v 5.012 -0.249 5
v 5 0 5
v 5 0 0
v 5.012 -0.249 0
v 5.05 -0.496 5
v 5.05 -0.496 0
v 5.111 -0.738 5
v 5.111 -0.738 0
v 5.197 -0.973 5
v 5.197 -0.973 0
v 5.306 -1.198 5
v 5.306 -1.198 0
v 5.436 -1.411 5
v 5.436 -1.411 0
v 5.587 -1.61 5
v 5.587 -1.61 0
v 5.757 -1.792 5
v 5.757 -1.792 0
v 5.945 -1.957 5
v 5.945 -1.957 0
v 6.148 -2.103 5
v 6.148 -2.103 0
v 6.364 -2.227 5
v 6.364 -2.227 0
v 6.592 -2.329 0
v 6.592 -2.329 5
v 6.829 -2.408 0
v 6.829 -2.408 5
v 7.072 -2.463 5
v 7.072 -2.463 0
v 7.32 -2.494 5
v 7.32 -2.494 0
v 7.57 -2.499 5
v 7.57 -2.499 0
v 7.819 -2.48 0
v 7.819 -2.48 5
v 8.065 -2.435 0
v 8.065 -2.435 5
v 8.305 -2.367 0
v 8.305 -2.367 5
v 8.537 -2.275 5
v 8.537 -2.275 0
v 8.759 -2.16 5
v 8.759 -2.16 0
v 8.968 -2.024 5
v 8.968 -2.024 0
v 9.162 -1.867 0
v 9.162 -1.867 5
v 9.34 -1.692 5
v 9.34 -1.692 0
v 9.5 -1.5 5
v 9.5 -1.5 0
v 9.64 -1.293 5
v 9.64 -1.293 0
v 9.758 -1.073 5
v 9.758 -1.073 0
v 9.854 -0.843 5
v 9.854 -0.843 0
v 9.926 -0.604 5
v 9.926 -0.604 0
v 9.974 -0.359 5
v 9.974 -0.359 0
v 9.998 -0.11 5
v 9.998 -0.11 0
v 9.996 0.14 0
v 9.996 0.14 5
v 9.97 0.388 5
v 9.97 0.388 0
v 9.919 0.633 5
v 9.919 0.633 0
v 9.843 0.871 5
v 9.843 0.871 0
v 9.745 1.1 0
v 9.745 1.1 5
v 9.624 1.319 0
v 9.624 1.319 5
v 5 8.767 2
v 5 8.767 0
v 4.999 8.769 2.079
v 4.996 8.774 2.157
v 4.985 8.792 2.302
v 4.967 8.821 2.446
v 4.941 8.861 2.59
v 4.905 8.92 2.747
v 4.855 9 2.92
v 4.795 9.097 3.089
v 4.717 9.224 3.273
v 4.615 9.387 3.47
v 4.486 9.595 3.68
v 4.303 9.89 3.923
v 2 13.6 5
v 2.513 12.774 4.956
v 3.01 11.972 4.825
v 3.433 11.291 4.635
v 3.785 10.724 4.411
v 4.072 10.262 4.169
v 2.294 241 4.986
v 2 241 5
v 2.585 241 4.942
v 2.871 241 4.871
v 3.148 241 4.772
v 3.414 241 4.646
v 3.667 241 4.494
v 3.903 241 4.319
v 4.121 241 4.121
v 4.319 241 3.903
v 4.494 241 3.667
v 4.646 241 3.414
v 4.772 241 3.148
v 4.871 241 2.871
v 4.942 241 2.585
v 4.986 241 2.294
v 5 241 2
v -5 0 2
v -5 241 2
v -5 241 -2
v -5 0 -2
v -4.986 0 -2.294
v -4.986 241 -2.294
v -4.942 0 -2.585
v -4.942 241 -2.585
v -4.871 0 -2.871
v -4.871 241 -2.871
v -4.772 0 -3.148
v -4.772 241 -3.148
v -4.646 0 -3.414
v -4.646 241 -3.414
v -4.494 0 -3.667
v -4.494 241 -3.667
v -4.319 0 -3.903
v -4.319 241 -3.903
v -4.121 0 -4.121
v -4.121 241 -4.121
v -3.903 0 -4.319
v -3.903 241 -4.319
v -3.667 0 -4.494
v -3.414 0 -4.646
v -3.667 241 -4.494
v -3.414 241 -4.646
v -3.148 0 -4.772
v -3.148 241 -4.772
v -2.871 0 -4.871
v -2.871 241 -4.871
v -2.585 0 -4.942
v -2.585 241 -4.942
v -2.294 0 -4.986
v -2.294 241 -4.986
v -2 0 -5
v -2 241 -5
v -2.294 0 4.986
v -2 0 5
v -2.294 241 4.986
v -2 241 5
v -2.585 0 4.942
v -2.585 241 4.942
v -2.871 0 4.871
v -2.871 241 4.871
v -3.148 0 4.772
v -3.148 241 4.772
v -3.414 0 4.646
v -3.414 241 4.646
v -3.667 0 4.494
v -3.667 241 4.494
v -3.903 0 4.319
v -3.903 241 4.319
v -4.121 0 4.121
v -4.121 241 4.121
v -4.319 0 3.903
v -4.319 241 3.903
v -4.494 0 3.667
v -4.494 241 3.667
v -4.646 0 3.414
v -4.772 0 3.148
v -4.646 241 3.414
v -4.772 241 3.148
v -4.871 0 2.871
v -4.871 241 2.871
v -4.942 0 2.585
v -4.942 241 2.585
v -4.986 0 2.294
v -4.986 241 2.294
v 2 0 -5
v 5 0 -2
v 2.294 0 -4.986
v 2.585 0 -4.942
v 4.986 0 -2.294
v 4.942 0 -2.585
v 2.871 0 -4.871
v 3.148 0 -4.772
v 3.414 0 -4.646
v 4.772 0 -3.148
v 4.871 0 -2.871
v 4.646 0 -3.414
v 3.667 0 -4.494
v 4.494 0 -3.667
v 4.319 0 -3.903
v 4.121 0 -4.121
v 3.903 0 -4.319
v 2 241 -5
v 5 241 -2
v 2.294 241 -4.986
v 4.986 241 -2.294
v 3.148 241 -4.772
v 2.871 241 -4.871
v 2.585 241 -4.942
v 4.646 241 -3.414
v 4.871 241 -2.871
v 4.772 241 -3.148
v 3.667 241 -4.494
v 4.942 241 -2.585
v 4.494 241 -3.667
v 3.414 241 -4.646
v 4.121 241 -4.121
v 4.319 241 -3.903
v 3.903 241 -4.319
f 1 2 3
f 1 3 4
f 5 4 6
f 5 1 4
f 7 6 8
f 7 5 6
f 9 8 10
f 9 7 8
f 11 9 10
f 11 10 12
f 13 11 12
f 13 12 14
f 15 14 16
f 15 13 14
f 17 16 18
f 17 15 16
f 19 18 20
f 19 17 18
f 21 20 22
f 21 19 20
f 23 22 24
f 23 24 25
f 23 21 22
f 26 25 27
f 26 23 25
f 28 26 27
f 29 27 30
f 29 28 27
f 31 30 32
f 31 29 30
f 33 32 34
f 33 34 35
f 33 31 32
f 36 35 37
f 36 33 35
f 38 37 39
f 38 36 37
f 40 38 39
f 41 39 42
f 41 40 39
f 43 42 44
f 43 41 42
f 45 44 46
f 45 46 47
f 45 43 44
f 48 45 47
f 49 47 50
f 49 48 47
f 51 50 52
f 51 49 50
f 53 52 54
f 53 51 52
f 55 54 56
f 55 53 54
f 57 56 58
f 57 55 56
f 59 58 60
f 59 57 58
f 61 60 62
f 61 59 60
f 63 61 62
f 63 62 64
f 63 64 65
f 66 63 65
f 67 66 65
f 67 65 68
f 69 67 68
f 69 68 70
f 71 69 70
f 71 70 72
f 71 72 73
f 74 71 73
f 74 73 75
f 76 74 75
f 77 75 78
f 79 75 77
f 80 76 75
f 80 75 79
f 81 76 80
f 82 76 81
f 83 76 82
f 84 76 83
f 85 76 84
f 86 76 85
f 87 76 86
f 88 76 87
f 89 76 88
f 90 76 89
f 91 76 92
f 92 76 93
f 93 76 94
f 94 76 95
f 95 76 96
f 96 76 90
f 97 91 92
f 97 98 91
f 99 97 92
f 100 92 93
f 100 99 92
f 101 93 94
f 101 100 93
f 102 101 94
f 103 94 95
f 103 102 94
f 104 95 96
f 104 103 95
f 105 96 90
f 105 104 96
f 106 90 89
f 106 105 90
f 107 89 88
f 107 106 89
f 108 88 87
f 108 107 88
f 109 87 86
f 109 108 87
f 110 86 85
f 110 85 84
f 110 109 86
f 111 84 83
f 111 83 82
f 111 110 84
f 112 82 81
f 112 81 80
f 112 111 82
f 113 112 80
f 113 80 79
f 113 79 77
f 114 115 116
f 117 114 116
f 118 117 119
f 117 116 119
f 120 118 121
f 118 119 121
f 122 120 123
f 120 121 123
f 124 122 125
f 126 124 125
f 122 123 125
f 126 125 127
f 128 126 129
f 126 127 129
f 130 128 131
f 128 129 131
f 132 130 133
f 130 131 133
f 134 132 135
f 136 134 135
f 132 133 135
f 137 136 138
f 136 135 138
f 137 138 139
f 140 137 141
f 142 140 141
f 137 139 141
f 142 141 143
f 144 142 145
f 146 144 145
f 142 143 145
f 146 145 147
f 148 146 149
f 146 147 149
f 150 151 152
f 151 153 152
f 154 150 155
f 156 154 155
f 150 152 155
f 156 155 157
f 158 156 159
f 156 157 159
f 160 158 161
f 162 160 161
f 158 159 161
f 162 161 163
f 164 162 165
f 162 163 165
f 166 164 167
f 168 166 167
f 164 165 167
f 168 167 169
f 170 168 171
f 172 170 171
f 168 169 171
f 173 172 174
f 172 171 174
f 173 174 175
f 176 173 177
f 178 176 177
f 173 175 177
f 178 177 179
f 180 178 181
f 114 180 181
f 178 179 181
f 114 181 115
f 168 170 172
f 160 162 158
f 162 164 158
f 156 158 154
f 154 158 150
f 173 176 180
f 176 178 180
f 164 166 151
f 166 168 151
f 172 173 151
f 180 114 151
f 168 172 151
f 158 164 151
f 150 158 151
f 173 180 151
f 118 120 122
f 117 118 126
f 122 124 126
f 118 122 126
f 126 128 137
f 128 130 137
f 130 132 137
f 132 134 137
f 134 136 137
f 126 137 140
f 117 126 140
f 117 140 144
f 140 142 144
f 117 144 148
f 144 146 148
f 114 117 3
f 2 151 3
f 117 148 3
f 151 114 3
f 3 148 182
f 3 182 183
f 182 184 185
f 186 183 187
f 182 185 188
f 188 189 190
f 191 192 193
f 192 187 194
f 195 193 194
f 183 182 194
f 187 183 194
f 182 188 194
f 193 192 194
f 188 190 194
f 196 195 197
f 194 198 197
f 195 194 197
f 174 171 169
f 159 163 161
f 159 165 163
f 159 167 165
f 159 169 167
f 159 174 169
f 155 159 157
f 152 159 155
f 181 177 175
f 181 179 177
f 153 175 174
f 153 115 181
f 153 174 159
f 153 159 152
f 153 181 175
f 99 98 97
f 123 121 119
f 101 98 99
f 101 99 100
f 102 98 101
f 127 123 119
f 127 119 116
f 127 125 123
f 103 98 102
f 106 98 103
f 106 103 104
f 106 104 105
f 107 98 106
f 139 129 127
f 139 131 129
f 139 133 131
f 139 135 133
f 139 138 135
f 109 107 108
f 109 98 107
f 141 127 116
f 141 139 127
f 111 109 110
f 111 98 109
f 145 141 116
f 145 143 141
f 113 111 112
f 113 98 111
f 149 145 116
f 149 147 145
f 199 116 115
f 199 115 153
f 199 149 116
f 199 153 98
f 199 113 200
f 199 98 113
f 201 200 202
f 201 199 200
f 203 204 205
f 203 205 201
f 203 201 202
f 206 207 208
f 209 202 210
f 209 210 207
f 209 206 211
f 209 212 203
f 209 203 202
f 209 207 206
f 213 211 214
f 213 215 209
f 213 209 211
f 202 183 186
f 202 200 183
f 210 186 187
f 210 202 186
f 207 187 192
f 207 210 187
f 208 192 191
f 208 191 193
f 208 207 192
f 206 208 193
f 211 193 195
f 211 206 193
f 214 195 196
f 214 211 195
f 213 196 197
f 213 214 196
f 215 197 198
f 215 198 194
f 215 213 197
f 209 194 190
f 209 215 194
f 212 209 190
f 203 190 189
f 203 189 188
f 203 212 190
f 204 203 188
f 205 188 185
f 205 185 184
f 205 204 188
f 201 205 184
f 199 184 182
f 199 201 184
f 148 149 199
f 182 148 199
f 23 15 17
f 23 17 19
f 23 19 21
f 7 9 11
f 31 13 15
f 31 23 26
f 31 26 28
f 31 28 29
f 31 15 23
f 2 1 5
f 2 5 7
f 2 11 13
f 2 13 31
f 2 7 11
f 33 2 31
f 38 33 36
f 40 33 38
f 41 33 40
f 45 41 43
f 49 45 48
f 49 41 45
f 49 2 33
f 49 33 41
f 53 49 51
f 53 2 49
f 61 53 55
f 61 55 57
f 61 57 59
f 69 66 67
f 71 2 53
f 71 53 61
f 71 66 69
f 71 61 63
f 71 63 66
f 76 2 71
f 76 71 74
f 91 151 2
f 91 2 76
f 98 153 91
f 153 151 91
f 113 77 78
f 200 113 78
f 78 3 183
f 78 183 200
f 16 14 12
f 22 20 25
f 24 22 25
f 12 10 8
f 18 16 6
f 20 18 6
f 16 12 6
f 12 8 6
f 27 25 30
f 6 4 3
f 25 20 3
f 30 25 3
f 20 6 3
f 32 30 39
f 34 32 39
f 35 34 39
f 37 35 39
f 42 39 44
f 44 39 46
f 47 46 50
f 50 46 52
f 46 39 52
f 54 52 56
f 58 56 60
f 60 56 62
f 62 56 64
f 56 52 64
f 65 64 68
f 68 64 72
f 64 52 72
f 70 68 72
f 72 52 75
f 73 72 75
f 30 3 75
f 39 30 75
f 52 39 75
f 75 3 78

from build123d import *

# Parameters (mm, degrees)
SKETCH3_W           = 10
SKETCH3_H           = 10
BOSS_EXTRUDE3_DEPTH = 241
BOSS_EXTRUDE4_DEPTH = 5
FILLET1_R           = 3


with BuildPart() as part:
    # Sketch3 → Boss-Extrude3 (new body)
    with BuildSketch(Plane(origin=(0, 0, 0), x_dir=(1, 0, 0), z_dir=(0, 1, 0))):
        Rectangle(SKETCH3_W, SKETCH3_H)
    extrude(amount=BOSS_EXTRUDE3_DEPTH)

    # Sketch4 → Boss-Extrude4 (add)
    with BuildSketch(Plane.XY.offset(5)):
        with BuildLine():
            Line((5, 8.767157353), (5, 0))
            ThreePointArc((5, 0), (8.185559909, -2.404164639), (9.624006089, 1.318559113))
            Line((9.624006089, 1.318559113), (5, 8.767157353))
        make_face()
    extrude(amount=-BOSS_EXTRUDE4_DEPTH)

    # Fillet1
    fillet1_edges = [part.edges().sort_by_distance(p)[0] for p in [
        (-5, 120.5, -5),
        (5, 120.5, -5),
        (5, 124.883578677, 5),
        (-5, 120.5, 5),
    ]]
    fillet(fillet1_edges, radius=FILLET1_R)


solid = part.part
